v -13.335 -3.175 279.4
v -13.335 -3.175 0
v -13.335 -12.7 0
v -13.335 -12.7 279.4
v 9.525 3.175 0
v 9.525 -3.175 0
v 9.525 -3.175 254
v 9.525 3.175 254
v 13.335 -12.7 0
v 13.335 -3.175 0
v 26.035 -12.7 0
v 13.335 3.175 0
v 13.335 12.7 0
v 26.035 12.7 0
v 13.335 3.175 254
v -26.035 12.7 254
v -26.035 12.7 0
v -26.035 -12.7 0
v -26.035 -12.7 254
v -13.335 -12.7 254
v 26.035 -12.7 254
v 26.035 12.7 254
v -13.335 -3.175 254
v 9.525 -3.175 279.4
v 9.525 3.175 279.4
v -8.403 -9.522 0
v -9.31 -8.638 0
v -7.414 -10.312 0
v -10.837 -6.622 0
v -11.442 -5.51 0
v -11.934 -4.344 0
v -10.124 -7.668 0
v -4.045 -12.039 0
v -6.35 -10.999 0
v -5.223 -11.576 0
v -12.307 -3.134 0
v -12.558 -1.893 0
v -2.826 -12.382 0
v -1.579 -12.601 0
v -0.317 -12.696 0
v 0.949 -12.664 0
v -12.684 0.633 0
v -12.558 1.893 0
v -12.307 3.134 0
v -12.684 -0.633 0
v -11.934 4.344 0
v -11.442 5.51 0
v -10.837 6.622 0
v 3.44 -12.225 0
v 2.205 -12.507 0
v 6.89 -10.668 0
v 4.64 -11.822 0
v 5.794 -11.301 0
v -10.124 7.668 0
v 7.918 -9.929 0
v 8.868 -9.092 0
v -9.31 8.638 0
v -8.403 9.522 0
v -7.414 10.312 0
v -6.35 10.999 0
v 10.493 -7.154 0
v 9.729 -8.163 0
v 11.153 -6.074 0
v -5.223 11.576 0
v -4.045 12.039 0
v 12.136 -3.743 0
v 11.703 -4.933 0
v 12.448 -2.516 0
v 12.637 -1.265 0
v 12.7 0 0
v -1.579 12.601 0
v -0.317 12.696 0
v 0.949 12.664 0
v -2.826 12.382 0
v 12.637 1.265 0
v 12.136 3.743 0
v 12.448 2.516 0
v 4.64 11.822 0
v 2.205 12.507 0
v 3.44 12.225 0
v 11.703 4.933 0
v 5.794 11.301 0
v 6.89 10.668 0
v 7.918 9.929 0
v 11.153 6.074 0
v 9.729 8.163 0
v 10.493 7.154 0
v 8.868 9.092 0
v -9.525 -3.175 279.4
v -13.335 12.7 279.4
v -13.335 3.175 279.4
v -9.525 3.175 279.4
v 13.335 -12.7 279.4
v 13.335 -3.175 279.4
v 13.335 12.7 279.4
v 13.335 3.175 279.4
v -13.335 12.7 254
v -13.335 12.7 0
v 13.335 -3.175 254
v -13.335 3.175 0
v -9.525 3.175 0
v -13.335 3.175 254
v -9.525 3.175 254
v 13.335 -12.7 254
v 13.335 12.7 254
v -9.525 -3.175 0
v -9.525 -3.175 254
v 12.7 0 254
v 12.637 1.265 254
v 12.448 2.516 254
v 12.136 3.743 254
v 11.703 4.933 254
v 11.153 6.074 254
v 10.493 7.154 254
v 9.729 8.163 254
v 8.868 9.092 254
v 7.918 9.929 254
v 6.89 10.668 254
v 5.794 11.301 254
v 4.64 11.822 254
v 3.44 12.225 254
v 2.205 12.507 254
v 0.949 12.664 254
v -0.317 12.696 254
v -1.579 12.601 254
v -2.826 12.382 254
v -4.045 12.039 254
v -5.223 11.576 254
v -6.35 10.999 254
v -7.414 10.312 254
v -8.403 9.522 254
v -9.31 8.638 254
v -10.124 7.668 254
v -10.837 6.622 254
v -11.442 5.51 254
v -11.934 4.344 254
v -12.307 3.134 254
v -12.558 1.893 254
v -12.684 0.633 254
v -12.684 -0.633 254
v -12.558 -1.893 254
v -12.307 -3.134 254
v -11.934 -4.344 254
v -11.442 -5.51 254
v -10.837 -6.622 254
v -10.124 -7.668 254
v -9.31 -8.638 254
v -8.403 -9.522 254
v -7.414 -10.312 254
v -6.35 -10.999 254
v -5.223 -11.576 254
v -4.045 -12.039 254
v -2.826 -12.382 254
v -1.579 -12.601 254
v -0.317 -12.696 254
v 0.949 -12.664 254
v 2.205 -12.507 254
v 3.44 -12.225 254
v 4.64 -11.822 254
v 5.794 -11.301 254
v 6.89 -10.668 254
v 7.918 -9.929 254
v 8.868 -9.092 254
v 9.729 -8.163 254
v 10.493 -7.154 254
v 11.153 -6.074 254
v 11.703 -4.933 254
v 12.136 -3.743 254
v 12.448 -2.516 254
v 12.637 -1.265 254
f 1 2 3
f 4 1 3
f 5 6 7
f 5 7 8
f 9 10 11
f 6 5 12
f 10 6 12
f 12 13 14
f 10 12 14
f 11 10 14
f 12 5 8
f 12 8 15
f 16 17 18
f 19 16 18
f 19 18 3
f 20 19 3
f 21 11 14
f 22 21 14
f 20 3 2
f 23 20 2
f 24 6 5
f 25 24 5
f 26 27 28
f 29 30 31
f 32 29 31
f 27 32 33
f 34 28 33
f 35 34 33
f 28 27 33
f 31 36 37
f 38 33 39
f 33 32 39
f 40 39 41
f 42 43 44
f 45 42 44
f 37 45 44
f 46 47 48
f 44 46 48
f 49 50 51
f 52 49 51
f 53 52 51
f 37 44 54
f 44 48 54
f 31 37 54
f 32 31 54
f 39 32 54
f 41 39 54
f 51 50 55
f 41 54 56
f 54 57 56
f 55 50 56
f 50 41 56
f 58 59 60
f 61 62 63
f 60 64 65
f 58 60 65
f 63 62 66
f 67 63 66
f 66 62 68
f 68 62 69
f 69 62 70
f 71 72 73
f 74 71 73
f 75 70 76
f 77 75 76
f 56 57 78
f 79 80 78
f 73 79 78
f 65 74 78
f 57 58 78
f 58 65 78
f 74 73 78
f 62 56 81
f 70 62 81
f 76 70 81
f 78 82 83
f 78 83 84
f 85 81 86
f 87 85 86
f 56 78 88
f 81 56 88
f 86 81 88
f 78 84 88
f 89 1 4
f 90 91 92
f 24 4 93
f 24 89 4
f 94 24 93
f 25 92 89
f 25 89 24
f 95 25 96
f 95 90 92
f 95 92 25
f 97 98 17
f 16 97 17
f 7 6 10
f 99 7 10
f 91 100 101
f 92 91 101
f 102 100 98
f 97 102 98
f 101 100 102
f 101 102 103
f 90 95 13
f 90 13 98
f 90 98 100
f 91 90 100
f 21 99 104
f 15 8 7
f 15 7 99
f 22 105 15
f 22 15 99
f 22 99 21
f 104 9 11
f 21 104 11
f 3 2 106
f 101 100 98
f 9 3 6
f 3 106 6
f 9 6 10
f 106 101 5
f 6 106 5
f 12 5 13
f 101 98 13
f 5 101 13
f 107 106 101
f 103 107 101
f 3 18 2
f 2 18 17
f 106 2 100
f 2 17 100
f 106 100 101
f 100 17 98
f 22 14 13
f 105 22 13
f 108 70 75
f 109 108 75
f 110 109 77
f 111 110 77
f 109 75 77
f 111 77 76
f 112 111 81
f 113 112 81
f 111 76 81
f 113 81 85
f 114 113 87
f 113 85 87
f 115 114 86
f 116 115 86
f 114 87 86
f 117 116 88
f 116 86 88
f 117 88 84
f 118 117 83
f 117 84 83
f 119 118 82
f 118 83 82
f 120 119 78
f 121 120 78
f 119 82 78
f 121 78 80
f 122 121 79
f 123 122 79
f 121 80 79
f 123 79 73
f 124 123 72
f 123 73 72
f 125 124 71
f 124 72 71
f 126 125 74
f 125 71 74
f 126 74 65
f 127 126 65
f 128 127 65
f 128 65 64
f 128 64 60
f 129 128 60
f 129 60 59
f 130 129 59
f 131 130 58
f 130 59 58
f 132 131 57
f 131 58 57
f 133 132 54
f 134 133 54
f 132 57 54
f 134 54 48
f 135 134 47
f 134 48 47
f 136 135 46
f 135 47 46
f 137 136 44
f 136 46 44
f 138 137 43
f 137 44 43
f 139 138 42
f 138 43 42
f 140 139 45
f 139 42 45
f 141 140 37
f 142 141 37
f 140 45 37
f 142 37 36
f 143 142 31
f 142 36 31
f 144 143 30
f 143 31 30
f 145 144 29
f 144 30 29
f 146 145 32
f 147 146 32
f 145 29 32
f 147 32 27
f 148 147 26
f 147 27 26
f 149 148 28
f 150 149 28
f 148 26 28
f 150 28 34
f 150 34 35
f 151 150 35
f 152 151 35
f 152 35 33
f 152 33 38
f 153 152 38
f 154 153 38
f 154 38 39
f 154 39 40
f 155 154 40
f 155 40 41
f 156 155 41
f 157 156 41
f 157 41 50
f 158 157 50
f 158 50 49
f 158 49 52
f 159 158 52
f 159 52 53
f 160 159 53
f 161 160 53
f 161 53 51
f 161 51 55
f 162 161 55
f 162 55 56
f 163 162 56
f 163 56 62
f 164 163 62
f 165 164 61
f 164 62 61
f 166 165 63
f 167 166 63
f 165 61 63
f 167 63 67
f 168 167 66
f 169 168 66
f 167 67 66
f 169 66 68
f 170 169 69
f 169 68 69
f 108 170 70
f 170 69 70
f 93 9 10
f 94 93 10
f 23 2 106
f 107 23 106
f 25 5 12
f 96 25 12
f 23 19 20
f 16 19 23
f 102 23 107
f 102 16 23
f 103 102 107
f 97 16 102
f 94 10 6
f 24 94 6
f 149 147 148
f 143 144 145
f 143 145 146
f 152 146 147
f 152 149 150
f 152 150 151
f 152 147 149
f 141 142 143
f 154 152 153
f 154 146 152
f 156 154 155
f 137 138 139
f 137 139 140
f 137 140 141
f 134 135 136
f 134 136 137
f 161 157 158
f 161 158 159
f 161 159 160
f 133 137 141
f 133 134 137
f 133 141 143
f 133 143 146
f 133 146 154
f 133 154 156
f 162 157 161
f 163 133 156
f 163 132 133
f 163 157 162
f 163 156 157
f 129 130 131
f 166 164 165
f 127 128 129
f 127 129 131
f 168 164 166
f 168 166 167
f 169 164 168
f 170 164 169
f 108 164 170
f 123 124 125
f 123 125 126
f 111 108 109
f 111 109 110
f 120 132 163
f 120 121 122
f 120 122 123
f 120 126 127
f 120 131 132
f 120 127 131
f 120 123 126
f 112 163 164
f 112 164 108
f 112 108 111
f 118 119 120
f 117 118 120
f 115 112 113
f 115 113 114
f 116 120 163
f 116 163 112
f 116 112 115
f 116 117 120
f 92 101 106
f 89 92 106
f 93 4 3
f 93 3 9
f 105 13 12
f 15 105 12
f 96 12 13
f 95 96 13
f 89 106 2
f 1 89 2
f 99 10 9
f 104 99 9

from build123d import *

# Parameters (mm, degrees)
F0_R     = 12.7
F1_DEPTH = 254
F2_W     = 3.81
F2_H     = 6.35
F3_DEPTH = 254
F2_W_2   = 19.05
F2_H_2   = 4.7625
F4_DEPTH = 279.4


with BuildPart() as f1:
    # F0 (on Top) → F1 (new body)
    with BuildSketch(Plane.XY):
        Circle(F0_R)
    extrude(amount=F1_DEPTH)


with BuildPart() as f3:
    # F2 (on Top) → F3 (new body)
    with BuildSketch(Plane.XY):
        Polygon((-13.335, -12.7), (-13.335, -3.175), (-13.335, 3.175), (-13.335, 12.7), (-26.035, 12.7), (-26.035, -12.7), align=None)
        with Locations((-11.43, 0)):
            Rectangle(F2_W, F2_H)
        with Locations((11.43, 0)):
            Rectangle(F2_W, F2_H)
        Polygon((13.335, 3.175), (13.335, -3.175), (13.335, -12.7), (26.035, -12.7), (26.035, 12.7), (13.335, 12.7), align=None)
    extrude(amount=F3_DEPTH)


with BuildPart() as f4:
    # F2 (on Top) → F4 (new body)
    with BuildSketch(Plane.XY):
        Polygon((9.525, 7.9375), (9.525, 3.175), (13.335, 3.175), (13.335, 12.7), (-13.335, 12.7), (-13.335, 3.175), (-9.525, 3.175), (-9.525, 7.9375), align=None)
        with Locations((0, 5.55625)):
            Rectangle(F2_W_2, F2_H_2)
        Rectangle(F2_W_2, F2_H)
        with Locations((0, -5.55625)):
            Rectangle(F2_W_2, F2_H_2)
        Polygon((9.525, -3.175), (9.525, -7.9375), (-9.525, -7.9375), (-9.525, -3.175), (-13.335, -3.175), (-13.335, -12.7), (13.335, -12.7), (13.335, -3.175), align=None)
    extrude(amount=F4_DEPTH)


solid = Compound([f1.part, f3.part, f4.part])
